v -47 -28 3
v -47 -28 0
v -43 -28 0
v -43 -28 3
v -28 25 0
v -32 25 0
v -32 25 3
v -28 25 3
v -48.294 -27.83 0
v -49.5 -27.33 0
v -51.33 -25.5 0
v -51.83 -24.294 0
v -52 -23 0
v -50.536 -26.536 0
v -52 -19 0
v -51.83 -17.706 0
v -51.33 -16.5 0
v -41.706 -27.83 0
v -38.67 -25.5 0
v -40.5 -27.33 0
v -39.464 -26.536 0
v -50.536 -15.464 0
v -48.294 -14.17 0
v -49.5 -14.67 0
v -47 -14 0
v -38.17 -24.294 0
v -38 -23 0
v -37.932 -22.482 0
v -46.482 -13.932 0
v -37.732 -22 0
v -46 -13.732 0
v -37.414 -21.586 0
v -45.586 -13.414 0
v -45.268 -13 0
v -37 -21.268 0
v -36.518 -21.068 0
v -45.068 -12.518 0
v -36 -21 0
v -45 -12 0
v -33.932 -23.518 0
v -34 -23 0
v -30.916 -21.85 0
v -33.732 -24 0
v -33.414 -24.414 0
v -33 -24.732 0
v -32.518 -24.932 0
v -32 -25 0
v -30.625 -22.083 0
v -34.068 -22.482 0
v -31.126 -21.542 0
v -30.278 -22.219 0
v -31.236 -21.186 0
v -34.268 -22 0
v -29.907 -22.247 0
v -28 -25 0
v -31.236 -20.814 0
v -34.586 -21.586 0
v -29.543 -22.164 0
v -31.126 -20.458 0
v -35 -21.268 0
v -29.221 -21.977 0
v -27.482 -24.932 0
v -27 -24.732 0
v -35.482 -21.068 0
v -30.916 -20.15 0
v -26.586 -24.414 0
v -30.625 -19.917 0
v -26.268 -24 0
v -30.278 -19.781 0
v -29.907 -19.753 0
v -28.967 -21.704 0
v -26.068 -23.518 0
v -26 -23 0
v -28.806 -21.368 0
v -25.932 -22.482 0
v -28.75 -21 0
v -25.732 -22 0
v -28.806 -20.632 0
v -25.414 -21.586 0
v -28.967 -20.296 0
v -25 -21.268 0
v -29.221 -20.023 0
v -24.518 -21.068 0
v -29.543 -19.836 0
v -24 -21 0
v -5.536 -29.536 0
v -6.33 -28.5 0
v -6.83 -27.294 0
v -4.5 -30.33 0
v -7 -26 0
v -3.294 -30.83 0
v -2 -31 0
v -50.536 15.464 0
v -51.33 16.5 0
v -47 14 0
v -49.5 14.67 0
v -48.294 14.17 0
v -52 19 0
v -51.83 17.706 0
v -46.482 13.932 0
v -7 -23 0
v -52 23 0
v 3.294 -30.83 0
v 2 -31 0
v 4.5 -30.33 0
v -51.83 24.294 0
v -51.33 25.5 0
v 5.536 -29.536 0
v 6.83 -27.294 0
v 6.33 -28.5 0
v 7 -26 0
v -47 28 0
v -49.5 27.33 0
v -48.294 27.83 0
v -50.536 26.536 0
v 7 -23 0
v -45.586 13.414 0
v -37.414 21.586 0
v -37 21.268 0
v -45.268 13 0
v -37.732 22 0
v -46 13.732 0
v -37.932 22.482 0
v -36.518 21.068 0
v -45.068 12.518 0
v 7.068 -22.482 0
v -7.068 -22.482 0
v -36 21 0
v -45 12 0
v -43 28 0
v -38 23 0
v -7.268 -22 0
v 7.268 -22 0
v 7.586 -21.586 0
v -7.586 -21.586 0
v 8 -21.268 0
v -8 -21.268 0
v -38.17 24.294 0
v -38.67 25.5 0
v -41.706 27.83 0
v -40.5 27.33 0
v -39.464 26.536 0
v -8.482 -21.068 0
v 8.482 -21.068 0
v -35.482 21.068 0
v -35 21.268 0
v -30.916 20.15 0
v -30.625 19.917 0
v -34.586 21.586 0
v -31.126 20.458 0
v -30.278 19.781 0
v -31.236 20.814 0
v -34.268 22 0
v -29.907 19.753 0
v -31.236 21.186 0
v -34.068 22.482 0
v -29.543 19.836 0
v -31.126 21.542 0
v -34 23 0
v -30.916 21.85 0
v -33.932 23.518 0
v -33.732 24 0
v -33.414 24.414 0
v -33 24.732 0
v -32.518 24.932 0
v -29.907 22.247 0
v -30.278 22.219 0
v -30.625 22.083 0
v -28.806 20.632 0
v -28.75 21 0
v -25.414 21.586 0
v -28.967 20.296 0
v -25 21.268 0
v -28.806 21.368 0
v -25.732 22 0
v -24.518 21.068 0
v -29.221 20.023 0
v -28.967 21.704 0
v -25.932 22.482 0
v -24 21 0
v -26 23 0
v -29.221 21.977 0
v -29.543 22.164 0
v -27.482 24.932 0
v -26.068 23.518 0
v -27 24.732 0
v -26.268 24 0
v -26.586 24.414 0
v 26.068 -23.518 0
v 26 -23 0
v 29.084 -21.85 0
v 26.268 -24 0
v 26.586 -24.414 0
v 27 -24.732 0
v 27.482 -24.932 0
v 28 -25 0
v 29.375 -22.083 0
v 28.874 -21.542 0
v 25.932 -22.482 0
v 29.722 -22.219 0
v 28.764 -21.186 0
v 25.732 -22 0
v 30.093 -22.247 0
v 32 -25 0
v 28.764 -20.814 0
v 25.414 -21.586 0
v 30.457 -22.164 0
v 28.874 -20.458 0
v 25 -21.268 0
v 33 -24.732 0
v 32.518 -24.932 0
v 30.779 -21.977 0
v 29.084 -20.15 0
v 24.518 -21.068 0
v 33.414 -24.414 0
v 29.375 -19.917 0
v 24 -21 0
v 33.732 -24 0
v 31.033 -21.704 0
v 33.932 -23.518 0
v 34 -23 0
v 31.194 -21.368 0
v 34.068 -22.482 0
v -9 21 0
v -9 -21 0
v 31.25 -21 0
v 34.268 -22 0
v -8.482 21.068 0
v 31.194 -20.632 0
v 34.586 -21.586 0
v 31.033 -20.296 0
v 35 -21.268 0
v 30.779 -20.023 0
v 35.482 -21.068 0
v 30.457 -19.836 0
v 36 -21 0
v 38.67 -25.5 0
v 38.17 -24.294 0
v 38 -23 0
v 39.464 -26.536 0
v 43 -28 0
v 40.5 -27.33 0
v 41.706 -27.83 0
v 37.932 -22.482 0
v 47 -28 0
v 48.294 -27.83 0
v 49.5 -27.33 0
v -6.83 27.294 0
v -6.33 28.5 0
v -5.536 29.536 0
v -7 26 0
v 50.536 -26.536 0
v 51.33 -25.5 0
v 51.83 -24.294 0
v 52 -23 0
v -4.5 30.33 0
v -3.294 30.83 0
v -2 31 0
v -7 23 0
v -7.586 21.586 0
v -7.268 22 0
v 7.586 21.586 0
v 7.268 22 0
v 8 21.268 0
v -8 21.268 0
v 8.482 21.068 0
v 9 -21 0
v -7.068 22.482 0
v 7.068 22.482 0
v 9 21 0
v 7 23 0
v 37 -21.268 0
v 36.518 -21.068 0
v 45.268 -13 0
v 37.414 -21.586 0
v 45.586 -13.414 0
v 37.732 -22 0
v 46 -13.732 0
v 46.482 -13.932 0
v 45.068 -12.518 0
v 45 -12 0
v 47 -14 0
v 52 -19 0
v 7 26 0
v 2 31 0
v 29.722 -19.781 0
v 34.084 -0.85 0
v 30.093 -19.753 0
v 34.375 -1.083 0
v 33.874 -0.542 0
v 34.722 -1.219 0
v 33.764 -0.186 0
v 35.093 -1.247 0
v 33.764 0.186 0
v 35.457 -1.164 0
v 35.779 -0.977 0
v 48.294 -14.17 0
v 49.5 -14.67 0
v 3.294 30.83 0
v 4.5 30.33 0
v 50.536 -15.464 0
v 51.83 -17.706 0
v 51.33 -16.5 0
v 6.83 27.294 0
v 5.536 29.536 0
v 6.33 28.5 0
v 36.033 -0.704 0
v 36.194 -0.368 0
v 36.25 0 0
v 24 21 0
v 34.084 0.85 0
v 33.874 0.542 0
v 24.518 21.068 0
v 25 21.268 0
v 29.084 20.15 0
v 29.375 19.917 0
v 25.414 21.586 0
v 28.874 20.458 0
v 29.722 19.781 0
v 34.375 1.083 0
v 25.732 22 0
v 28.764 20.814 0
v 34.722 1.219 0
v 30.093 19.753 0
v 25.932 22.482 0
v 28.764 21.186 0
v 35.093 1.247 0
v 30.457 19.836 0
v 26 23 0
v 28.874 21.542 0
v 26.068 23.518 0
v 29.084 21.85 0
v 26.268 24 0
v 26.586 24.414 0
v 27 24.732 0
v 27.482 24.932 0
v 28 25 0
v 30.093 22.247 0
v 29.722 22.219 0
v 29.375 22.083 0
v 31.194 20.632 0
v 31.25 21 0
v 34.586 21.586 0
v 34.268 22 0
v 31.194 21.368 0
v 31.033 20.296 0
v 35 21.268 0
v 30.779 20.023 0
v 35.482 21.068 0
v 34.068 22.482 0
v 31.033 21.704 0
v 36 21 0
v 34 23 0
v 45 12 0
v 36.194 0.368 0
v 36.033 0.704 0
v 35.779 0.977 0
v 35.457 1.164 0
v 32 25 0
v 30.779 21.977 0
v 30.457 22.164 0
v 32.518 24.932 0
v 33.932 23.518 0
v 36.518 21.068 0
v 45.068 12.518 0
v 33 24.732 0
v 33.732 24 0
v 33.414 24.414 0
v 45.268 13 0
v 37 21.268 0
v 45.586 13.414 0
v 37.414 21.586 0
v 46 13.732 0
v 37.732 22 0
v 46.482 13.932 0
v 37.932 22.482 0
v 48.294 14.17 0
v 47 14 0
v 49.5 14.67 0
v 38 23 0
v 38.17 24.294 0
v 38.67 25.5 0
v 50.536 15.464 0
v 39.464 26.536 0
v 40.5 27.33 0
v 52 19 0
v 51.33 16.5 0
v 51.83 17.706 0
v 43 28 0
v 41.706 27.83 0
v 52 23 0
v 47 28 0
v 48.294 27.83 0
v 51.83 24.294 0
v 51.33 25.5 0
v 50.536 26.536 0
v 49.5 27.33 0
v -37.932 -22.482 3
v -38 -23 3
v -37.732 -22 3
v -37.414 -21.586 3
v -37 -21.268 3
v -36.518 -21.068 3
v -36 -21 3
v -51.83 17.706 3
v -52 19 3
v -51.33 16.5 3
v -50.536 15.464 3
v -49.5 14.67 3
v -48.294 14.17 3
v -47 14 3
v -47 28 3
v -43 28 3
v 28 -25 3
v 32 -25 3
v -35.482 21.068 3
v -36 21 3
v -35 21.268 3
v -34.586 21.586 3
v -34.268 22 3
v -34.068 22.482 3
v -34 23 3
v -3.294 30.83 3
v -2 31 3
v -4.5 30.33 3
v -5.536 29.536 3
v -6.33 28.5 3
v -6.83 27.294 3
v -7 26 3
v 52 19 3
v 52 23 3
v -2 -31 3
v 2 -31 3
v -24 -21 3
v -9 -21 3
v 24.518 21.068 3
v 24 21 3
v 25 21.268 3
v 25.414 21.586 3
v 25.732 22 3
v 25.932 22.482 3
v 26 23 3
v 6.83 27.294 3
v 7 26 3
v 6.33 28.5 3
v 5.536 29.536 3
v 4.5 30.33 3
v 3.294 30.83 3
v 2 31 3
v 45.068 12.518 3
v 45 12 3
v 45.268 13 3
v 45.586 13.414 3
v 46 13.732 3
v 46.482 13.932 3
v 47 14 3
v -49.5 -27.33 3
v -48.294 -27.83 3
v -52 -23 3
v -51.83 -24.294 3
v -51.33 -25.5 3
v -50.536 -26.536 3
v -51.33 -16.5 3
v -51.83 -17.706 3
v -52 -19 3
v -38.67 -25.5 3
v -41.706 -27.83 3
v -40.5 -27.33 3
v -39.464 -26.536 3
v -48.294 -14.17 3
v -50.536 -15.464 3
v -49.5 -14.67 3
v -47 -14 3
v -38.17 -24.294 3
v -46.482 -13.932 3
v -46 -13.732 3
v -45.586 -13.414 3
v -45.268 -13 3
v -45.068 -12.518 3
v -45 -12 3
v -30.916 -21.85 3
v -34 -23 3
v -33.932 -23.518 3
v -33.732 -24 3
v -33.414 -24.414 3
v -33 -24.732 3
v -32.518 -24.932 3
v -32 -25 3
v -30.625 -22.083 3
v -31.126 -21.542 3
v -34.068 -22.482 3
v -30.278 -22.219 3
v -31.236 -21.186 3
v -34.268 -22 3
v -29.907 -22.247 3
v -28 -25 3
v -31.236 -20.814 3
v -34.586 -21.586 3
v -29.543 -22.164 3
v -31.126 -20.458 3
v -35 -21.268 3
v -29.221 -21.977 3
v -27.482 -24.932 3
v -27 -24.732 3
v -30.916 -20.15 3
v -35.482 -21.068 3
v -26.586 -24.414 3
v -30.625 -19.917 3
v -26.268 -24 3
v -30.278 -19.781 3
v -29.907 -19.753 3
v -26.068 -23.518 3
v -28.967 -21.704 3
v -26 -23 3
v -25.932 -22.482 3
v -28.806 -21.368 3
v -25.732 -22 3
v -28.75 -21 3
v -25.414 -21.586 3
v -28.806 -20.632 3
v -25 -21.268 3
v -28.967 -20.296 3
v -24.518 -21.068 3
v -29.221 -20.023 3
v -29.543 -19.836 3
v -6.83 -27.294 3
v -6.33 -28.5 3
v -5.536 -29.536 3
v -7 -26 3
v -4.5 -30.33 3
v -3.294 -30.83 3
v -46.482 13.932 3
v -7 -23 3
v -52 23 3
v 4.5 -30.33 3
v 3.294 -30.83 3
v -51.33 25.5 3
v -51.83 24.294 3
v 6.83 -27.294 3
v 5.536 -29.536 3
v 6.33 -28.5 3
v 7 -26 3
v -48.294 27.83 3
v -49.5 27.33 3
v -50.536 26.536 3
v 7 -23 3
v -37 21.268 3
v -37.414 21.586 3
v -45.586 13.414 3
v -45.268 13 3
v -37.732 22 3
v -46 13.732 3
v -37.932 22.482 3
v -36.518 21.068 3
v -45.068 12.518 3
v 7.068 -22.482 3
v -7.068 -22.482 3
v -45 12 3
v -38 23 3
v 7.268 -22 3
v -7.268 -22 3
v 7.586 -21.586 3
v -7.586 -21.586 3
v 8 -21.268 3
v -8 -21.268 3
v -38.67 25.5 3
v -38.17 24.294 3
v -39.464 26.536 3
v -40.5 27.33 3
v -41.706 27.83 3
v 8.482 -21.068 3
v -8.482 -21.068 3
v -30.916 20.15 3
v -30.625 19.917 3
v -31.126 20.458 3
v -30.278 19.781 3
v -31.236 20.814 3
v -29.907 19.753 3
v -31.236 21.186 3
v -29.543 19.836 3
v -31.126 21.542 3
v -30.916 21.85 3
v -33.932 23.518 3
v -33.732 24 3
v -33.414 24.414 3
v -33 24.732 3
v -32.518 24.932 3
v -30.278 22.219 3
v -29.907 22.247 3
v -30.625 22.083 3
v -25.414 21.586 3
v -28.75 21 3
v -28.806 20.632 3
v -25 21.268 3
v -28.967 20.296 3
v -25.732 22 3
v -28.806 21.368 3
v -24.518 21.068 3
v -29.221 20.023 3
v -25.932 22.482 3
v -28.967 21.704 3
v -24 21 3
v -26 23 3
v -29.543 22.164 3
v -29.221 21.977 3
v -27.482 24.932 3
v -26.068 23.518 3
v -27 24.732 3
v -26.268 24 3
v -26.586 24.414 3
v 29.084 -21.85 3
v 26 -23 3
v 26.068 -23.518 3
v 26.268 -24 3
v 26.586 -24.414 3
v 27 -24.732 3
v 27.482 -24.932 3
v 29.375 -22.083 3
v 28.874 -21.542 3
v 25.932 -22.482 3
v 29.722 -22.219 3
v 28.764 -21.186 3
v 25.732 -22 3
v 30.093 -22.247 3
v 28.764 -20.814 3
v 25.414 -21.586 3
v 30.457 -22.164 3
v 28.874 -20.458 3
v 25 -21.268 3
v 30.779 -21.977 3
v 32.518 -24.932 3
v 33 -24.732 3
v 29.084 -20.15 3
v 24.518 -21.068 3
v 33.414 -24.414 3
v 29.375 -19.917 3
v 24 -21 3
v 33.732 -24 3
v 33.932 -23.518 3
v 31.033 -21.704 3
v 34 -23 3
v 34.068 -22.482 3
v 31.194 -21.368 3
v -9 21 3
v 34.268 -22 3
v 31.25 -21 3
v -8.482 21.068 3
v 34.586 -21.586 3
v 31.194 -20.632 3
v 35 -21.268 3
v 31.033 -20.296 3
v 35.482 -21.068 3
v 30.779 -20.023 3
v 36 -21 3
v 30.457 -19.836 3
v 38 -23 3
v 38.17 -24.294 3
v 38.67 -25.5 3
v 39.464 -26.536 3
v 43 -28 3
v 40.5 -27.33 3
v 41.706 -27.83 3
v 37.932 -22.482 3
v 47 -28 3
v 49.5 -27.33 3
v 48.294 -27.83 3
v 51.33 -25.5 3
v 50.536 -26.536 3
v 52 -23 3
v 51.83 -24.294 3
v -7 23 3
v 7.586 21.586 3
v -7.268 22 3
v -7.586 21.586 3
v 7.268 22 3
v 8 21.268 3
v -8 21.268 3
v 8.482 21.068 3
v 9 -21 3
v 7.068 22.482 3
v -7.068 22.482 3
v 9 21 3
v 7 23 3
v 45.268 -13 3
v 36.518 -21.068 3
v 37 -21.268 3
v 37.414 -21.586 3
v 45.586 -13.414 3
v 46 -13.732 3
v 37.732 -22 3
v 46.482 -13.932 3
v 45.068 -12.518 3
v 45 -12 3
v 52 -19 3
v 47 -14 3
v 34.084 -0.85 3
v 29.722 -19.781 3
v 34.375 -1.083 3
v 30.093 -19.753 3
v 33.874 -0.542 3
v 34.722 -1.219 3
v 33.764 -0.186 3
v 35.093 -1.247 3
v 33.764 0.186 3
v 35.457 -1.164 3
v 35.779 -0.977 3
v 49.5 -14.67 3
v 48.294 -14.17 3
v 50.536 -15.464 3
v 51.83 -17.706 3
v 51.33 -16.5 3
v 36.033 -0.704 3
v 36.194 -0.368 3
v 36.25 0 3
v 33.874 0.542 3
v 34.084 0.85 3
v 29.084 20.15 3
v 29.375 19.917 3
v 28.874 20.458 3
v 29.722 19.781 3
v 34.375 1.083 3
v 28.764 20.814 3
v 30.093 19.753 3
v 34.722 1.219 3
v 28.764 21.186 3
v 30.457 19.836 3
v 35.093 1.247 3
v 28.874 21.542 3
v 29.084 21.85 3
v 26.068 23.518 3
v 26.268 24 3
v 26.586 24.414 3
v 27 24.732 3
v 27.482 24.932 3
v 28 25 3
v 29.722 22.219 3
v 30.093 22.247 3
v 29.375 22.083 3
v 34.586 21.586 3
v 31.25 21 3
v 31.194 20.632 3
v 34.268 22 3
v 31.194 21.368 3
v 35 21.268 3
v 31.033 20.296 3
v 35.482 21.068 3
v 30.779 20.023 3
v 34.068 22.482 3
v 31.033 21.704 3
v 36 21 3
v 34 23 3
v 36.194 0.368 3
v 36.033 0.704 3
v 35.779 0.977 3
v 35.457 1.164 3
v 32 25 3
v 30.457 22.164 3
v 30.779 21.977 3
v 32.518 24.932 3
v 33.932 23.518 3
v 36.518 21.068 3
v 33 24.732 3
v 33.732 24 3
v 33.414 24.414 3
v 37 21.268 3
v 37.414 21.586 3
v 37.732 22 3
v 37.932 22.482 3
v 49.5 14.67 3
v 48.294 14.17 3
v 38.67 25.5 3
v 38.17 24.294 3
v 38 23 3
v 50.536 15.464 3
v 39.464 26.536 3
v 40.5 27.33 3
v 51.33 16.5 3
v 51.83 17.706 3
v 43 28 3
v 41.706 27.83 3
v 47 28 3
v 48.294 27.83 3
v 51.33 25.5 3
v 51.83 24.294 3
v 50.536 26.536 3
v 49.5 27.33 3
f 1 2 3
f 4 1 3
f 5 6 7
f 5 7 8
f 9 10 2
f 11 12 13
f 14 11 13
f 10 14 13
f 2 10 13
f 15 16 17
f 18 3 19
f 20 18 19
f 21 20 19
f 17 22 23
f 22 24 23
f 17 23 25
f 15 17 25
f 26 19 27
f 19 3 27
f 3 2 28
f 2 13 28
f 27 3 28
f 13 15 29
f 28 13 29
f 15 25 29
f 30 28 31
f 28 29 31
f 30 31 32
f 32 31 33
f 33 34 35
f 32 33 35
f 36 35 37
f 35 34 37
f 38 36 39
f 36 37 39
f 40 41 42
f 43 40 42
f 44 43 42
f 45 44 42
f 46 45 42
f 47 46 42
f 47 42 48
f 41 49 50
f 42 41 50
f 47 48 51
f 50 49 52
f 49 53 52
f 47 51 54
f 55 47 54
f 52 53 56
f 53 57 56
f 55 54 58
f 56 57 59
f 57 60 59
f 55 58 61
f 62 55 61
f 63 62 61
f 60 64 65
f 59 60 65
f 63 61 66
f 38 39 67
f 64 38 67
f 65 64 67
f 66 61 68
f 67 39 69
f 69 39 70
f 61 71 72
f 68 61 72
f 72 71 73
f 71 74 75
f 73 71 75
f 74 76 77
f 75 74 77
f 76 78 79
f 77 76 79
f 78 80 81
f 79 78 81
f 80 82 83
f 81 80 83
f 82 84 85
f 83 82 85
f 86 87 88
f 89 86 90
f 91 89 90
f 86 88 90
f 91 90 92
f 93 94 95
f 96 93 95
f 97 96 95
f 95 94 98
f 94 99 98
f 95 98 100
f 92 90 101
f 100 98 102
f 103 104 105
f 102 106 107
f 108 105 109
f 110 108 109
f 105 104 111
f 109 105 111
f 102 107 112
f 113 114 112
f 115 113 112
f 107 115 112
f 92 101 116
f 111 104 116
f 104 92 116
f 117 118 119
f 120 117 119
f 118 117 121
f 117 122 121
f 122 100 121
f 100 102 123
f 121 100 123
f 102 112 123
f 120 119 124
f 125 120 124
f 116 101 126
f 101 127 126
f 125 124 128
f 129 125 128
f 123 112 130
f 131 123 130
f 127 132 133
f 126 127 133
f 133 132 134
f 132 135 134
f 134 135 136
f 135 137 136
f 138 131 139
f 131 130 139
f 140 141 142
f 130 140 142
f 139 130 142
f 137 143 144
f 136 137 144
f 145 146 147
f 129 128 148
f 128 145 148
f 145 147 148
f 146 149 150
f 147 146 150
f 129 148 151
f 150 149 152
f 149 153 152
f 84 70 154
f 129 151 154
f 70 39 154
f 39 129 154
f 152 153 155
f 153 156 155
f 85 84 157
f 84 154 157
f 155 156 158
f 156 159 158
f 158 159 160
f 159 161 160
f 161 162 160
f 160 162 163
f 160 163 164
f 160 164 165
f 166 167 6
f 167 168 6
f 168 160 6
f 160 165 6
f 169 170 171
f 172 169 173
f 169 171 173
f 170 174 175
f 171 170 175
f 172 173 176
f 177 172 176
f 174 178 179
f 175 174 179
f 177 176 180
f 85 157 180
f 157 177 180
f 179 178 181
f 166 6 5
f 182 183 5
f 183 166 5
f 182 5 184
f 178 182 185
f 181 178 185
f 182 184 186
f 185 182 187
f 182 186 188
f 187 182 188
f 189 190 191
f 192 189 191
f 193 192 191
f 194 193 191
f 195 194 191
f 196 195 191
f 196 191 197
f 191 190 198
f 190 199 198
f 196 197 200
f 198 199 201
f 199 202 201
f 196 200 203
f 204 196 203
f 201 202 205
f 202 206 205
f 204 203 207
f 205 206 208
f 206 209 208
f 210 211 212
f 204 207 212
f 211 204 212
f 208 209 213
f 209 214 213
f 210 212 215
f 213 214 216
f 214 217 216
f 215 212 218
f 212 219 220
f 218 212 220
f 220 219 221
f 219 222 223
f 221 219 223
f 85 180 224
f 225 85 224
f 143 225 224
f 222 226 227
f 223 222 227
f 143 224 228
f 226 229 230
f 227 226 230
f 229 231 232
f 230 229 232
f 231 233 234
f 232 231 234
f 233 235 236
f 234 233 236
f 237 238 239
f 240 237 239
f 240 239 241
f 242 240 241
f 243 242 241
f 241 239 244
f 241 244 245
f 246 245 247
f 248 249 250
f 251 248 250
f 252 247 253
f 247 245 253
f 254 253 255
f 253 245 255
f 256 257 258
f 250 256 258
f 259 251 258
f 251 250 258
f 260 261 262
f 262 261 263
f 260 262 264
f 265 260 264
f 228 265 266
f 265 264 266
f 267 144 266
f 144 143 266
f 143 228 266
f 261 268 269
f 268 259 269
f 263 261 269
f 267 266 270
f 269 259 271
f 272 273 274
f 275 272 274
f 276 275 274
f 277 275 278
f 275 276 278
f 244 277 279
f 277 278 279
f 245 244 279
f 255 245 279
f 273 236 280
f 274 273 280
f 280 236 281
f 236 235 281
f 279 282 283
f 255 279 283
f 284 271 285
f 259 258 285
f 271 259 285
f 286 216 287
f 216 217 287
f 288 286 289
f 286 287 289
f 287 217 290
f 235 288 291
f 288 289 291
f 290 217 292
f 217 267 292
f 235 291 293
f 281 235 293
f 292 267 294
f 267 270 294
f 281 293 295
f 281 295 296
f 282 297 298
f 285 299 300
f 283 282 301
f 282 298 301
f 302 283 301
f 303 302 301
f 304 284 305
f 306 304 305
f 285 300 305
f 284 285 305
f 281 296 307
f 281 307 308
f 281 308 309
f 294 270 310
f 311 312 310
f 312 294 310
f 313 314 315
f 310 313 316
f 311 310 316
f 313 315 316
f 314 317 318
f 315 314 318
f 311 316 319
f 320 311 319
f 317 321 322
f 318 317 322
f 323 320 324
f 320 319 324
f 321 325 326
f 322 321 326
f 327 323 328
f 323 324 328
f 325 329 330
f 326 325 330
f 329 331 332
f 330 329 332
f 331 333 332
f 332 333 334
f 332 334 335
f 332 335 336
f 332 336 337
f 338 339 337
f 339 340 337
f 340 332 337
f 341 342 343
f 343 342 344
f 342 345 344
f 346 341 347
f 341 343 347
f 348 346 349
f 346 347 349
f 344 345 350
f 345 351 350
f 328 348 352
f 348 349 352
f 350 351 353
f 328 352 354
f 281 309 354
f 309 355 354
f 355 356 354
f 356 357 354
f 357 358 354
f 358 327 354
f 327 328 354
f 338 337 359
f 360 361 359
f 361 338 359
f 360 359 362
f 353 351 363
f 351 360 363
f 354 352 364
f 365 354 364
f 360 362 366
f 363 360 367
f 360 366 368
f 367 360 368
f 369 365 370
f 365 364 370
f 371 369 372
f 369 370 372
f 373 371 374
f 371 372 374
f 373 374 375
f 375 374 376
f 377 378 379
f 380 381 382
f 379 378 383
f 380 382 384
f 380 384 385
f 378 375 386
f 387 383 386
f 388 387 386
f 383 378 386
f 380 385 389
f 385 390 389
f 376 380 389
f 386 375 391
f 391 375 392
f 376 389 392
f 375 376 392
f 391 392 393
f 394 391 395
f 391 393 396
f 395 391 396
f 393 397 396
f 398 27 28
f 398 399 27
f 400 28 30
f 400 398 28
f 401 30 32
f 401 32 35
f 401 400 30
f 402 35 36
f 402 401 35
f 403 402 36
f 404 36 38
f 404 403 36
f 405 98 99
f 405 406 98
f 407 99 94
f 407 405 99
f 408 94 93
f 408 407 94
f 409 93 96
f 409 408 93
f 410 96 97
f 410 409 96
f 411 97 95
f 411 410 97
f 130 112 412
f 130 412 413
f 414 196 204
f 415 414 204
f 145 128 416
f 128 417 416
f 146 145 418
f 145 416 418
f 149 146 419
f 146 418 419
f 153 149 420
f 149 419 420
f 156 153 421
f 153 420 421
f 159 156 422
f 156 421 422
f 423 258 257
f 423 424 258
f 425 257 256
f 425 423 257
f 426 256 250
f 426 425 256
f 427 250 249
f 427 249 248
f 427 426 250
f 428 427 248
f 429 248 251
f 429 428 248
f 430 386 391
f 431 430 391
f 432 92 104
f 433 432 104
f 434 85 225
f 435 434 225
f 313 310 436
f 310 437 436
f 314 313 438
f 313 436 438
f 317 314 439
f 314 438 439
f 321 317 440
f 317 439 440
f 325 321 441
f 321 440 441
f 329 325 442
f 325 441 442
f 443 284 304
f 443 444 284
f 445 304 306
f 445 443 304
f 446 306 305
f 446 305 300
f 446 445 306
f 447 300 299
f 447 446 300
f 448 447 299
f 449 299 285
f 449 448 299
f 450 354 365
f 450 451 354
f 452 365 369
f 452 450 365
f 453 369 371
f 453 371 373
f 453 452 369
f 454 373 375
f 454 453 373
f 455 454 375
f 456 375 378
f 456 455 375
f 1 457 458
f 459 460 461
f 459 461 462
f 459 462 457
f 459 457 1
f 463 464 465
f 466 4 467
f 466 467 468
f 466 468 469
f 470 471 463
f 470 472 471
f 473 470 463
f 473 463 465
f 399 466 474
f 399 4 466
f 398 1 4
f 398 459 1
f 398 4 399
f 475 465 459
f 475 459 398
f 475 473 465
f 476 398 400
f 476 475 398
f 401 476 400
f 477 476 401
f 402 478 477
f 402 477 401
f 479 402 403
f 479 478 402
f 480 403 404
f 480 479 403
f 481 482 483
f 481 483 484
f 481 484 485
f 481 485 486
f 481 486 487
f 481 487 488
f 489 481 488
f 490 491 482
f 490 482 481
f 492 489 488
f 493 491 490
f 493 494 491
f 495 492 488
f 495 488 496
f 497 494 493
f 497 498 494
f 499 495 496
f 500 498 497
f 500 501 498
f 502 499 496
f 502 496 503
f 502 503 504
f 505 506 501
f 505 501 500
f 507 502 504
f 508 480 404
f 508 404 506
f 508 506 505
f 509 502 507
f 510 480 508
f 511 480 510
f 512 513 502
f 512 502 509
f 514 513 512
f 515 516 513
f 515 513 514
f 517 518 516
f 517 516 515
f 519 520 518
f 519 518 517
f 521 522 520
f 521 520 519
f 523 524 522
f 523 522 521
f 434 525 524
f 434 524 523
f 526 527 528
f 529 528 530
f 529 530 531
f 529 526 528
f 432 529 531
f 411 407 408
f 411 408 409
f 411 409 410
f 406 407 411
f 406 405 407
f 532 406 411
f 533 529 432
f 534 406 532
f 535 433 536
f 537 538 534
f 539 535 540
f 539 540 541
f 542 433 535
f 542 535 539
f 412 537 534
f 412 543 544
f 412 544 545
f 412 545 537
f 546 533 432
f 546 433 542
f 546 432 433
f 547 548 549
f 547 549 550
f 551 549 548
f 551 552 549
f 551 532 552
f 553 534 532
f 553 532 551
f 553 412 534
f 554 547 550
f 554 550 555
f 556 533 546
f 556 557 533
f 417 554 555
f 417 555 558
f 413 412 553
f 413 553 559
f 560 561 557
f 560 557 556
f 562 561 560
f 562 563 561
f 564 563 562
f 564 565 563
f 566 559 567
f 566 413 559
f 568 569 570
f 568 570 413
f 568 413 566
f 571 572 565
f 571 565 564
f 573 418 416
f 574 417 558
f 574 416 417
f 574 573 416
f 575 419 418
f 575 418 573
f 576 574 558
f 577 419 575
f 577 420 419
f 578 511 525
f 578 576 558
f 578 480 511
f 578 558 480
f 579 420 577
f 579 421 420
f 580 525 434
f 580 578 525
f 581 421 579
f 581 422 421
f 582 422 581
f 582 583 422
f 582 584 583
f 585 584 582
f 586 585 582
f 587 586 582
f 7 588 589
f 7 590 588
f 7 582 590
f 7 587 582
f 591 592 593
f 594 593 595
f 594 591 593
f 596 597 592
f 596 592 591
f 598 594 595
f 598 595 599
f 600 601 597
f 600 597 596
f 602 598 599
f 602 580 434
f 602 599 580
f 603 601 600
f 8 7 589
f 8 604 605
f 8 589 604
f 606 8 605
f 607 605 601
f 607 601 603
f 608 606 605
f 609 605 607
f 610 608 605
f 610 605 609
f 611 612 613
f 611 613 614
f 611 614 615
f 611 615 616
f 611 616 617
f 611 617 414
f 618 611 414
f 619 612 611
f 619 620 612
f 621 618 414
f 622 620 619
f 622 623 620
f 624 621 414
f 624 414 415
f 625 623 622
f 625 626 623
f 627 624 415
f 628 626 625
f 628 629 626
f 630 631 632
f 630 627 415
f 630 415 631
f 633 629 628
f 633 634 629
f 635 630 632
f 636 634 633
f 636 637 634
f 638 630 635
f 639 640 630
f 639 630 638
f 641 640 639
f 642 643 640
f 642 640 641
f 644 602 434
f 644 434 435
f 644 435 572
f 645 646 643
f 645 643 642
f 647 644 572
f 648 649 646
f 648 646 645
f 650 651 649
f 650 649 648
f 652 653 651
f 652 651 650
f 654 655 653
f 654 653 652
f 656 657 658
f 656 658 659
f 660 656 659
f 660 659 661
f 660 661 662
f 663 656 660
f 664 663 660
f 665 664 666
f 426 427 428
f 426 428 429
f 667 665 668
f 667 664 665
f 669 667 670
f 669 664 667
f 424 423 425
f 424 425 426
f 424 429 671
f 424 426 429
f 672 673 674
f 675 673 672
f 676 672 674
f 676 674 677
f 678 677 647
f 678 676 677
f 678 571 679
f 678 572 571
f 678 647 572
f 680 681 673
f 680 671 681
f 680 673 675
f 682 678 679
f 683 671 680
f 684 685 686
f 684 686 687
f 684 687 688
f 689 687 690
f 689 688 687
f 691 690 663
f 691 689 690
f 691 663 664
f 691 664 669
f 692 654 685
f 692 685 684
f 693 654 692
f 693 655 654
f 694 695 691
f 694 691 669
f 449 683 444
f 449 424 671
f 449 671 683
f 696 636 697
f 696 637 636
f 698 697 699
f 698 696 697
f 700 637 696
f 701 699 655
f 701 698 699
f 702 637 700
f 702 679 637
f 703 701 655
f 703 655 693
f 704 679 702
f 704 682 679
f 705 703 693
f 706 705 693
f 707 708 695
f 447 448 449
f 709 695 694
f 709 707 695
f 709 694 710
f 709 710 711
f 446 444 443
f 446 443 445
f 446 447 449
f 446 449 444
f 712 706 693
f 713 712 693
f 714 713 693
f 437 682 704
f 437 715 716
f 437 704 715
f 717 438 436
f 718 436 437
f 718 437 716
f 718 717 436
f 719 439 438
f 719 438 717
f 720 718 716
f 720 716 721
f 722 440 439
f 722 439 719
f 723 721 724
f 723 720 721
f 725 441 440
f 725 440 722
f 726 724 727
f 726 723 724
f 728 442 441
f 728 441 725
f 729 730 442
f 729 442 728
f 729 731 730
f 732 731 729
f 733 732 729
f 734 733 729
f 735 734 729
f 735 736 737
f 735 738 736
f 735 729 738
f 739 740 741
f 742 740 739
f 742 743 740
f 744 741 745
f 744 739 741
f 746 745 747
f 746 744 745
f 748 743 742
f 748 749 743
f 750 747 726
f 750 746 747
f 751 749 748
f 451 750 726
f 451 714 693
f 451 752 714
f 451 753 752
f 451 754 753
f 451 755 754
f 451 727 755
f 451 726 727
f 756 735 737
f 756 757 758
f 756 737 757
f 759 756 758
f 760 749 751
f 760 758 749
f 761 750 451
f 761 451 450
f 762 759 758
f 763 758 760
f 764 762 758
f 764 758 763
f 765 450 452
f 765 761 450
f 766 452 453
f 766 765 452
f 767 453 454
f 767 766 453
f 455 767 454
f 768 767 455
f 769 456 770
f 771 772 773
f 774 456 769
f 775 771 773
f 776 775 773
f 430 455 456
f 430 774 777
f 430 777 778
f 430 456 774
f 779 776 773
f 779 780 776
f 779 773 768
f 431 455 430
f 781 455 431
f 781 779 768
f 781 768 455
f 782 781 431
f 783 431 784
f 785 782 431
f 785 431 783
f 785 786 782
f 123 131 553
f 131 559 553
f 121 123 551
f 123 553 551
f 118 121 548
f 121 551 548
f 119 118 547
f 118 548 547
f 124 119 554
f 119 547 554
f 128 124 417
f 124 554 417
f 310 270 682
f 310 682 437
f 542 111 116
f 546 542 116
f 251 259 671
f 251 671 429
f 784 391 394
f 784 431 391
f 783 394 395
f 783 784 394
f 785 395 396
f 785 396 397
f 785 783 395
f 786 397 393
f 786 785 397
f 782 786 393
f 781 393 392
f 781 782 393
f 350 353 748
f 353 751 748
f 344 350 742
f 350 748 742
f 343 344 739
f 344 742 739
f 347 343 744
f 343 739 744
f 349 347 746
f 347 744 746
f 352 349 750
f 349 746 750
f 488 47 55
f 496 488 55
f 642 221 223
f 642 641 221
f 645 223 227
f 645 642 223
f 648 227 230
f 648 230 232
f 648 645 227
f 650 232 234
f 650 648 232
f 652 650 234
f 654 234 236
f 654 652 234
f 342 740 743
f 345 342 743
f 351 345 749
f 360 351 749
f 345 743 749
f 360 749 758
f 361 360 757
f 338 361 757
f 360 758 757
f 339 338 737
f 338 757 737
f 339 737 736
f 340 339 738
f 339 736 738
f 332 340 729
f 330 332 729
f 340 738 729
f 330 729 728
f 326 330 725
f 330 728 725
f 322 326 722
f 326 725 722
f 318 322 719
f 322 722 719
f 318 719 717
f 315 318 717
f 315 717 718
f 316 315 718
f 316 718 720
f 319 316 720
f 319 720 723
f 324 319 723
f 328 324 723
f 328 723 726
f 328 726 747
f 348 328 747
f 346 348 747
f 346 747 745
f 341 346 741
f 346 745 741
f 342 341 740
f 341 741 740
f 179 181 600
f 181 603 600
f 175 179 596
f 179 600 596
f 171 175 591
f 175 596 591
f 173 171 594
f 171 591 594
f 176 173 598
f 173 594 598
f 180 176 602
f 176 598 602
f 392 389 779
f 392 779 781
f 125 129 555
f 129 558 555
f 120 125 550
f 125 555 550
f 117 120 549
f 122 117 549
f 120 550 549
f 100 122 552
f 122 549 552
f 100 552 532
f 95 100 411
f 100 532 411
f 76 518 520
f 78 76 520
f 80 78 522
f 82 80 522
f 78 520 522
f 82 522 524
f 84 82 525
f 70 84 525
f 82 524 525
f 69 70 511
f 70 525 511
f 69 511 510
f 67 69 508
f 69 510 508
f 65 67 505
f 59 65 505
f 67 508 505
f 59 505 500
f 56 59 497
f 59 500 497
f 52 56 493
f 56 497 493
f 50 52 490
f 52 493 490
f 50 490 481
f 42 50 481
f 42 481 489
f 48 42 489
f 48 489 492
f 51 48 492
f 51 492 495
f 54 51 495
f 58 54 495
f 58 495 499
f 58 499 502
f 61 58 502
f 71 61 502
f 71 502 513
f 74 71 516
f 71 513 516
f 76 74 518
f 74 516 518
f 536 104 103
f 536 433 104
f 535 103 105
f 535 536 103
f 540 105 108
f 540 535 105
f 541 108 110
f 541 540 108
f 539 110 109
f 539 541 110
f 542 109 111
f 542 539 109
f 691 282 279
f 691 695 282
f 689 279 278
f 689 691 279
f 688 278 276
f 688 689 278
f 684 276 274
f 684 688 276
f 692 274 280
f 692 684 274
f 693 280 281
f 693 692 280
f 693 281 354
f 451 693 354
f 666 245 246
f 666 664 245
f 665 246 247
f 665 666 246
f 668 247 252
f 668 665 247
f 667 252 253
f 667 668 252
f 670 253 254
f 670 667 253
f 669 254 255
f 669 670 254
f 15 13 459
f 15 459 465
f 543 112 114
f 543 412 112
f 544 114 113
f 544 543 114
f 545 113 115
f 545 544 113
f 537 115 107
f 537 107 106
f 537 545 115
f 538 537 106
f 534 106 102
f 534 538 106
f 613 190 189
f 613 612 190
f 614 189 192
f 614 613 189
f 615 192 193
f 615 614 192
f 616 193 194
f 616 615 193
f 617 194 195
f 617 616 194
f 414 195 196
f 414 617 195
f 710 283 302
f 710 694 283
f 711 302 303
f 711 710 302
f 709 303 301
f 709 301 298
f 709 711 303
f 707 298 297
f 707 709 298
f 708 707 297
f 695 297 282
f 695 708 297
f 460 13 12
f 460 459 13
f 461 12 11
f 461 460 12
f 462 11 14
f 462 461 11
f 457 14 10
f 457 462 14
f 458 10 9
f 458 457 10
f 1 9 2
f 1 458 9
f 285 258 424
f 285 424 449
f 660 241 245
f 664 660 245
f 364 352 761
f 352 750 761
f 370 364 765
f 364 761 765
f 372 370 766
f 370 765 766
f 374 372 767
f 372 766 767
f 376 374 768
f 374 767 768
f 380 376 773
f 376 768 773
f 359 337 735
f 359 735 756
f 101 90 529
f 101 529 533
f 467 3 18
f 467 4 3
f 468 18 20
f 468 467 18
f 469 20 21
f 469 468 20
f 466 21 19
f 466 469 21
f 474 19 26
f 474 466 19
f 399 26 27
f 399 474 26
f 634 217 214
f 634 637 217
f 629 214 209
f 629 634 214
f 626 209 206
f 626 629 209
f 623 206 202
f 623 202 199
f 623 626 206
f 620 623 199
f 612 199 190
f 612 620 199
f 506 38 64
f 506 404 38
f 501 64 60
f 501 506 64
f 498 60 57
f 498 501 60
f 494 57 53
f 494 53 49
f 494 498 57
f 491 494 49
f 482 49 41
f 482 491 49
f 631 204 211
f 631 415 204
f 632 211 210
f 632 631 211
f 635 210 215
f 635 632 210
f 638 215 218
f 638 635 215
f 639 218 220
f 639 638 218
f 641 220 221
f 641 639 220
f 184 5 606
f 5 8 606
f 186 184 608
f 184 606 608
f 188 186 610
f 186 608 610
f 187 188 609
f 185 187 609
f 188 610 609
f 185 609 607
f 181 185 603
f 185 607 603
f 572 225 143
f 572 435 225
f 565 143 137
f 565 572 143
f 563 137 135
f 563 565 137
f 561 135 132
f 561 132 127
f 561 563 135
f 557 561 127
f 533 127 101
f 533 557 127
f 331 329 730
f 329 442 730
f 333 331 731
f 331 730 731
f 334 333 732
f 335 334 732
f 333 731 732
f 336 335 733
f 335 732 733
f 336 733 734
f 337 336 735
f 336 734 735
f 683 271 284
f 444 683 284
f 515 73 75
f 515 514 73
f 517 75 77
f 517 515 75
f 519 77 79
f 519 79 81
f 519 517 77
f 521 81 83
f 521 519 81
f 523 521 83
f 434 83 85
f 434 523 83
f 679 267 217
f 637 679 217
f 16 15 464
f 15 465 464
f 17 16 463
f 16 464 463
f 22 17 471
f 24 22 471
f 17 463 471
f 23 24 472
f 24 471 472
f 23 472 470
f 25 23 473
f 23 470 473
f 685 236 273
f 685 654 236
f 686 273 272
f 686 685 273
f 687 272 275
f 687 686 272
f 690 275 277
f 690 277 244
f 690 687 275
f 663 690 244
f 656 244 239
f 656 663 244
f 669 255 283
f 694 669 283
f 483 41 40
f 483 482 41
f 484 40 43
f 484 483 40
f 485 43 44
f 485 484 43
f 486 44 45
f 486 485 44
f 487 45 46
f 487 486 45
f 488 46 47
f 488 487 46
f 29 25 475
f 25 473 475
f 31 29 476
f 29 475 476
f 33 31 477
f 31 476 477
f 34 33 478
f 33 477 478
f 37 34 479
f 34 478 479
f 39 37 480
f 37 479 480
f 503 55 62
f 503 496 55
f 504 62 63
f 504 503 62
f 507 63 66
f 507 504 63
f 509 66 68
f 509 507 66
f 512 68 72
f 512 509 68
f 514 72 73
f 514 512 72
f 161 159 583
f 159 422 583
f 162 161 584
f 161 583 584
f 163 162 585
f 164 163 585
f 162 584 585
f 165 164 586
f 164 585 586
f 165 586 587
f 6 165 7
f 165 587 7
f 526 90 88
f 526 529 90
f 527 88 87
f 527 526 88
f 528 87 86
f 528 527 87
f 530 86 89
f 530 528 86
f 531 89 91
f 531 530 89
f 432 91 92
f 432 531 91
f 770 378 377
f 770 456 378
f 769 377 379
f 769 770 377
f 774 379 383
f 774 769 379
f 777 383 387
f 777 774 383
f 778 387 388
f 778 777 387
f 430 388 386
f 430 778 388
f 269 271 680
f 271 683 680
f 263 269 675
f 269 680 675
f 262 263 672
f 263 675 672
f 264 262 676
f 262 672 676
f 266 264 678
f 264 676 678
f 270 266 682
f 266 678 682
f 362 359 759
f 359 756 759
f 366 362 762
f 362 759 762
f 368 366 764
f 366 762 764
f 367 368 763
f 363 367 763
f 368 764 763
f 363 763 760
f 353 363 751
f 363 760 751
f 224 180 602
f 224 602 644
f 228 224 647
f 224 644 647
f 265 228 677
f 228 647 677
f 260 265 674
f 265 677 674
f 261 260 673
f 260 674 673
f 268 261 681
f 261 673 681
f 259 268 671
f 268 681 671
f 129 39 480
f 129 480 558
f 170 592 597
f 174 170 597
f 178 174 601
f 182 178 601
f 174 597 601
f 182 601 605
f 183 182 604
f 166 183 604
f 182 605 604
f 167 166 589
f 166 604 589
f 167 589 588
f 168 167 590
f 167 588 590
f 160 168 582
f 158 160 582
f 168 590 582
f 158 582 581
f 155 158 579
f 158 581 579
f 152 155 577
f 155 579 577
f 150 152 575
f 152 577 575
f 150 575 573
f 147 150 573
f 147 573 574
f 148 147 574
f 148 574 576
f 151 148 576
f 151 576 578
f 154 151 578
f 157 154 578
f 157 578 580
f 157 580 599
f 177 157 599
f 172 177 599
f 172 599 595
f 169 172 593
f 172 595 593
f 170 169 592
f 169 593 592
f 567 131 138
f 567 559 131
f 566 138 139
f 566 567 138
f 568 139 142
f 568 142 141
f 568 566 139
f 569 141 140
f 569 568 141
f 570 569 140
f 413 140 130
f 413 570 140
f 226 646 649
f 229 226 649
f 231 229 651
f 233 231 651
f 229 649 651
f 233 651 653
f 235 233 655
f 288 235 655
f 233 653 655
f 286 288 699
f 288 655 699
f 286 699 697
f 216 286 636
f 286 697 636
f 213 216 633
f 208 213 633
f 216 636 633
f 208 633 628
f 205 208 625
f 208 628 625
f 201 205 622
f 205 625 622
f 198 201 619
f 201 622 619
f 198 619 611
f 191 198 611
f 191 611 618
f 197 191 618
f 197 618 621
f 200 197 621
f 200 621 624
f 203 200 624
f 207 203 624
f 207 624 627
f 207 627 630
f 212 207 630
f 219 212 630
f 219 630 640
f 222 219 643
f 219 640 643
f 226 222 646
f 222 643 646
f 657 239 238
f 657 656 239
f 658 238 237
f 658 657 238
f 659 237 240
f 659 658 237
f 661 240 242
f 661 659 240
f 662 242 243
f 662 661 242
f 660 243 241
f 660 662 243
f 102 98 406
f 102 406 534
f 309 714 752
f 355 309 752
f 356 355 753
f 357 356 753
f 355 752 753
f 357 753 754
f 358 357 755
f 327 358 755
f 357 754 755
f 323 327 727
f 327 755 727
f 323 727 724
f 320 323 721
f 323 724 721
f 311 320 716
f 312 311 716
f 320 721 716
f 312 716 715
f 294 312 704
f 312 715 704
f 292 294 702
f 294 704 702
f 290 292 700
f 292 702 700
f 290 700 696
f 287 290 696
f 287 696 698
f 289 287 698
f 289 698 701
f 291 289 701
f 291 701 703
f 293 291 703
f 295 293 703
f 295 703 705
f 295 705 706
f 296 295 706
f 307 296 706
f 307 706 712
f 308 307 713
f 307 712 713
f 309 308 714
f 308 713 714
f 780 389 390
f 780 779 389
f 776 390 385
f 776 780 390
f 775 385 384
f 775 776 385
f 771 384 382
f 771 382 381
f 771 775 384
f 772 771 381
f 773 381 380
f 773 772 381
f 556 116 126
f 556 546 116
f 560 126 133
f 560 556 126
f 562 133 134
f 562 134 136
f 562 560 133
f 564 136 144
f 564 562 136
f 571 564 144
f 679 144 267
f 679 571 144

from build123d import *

# Parameters (mm, degrees)
SKETCH1_W           = 90
SKETCH1_H           = 42
SKETCH1_W_2         = 14
SKETCH1_H_2         = 14
SKETCH1_H_3         = 20
SKETCH1_W_3         = 8
SKETCH1_H_4         = 8
BOSS_EXTRUDE1_DEPTH = 3
FILLET1_R           = 5
FILLET2_R           = 2
SKETCH3_R           = 1.25
CUT_EXTRUDE1_DEPTH  = 3
SKETCH4_R           = 1.25
CUT_EXTRUDE2_DEPTH  = 3


with BuildPart() as part:
    # Sketch1 → Boss-Extrude1 (new body)
    with BuildSketch(Plane.XY):
        Rectangle(SKETCH1_W, SKETCH1_H)
        with Locations((-45, 21)):
            Rectangle(SKETCH1_W_2, SKETCH1_H_2)
        with Locations((45, 21)):
            Rectangle(SKETCH1_W_2, SKETCH1_H_2)
        with Locations((45, -21)):
            Rectangle(SKETCH1_W_2, SKETCH1_H_2)
        with Locations((-45, -21)):
            Rectangle(SKETCH1_W_2, SKETCH1_H_2)
        with Locations((0, 21)):
            Rectangle(SKETCH1_W_2, SKETCH1_H_3)
        with Locations((0, -21)):
            Rectangle(SKETCH1_W_2, SKETCH1_H_3)
        with Locations((30, 21)):
            Rectangle(SKETCH1_W_3, SKETCH1_H_4)
        with Locations((-30, 21)):
            Rectangle(SKETCH1_W_3, SKETCH1_H_4)
        with Locations((30, -21)):
            Rectangle(SKETCH1_W_3, SKETCH1_H_4)
        with Locations((-30, -21)):
            Rectangle(SKETCH1_W_3, SKETCH1_H_4)
    extrude(amount=BOSS_EXTRUDE1_DEPTH)

    # Fillet1
    fillet1_edges = [part.edges().sort_by_distance(p)[0] for p in [
        (52, 14, 1.5),
        (52, 28, 1.5),
        (38, 28, 1.5),
        (7, 31, 1.5),
        (-7, 31, 1.5),
        (-38, 28, 1.5),
        (-52, 28, 1.5),
        (-52, 14, 1.5),
        (-52, -14, 1.5),
        (-52, -28, 1.5),
        (-38, -28, 1.5),
        (-7, -31, 1.5),
        (7, -31, 1.5),
        (38, -28, 1.5),
        (52, -28, 1.5),
        (52, -14, 1.5),
    ]]
    fillet(fillet1_edges, radius=FILLET1_R)

    # Fillet2
    fillet2_edges = [part.edges().sort_by_distance(p)[0] for p in [
        (-26, 25, 1.5),
        (-26, 21, 1.5),
        (-34, 25, 1.5),
        (-34, 21, 1.5),
        (-38, 21, 1.5),
        (34, 21, 1.5),
        (7, 21, 1.5),
        (26, 25, 1.5),
        (34, 25, 1.5),
        (38, 21, 1.5),
        (26, 21, 1.5),
        (-7, 21, 1.5),
        (45, 14, 1.5),
        (45, -14, 1.5),
        (38, -21, 1.5),
        (34, -21, 1.5),
        (34, -25, 1.5),
        (26, -25, 1.5),
        (26, -21, 1.5),
        (-7, -21, 1.5),
        (7, -21, 1.5),
        (-26, -21, 1.5),
        (-26, -25, 1.5),
        (-34, -25, 1.5),
        (-34, -21, 1.5),
        (-38, -21, 1.5),
        (-45, -14, 1.5),
        (-45, 14, 1.5),
    ]]
    fillet(fillet2_edges, radius=FILLET2_R - 0.0001)  # a hair under: the kernel refuses the full size

    # Sketch3 → Cut-Extrude1 (cut)
    with BuildSketch(Plane.XY.offset(3)):
        with Locations((-30, 21)):
            Circle(SKETCH3_R)
        with Locations((30, 21)):
            Circle(SKETCH3_R)
        with Locations((30, -21)):
            Circle(SKETCH3_R)
        with Locations((-30, -21)):
            Circle(SKETCH3_R)
    extrude(amount=-CUT_EXTRUDE1_DEPTH, mode=Mode.SUBTRACT)

    # Sketch4 → Cut-Extrude2 (cut)
    with BuildSketch(Plane.XY.offset(3)):
        with Locations((35, 0)):
            Circle(SKETCH4_R)
    extrude(amount=-CUT_EXTRUDE2_DEPTH, mode=Mode.SUBTRACT)


solid = part.part
